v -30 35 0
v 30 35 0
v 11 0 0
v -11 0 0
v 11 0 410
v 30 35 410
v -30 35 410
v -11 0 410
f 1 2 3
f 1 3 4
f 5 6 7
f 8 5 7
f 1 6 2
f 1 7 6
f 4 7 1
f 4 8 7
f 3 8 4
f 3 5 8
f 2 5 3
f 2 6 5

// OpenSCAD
// DOGS Print Shop — parametric car seat gap filler wedge
// Units: millimeters.
// Conservative OpenSCAD only: polygon, linear_extrude, cylinder, difference.
// No experimental features; should render in any recent OpenSCAD.
//
// COMPILE CHECK: PENDING (no openscad binary on build machine, 2026-09-09).
// Print strategy: the full 410 mm wedge does NOT fit a standard 220 mm bed,
// so print part="front" and part="back", then join with the alignment pins
// (part="pins") and glue. PETG or ASA recommended — PLA softens in a hot car.

/* [Dimensions] */
wedge_length = 410;   // total length along the seat
top_width    = 60;    // width at the top (widest, sits proud of the gap)
bottom_width = 22;    // width at the bottom (taper that wedges into the gap)
wedge_height = 35;    // vertical height

/* [Print strategy] */
part      = "full";   // [full, front, back, pins]
pin_dia   = 6;       // alignment pin diameter
pin_depth = 12;      // how deep each pin seats into a half

half_len = wedge_length / 2;

module profile() {
    polygon(points = [
        [-bottom_width/2, 0],
        [ bottom_width/2, 0],
        [  top_width/2, wedge_height],
        [ -top_width/2, wedge_height]
    ]);
}

module wedge_solid(len) {
    linear_extrude(height = len) profile();
}

// One half of the split wedge, with two pin sockets on its cut face.
// cut_at_top=true  -> cut face at z = half_len (front half)
// cut_at_top=false -> cut face at z = 0       (back half)
module half_wedge(cut_at_top) {
    cut_z = cut_at_top ? half_len : 0;
    difference() {
        wedge_solid(half_len);
        for (sx = [-1, 1])
            translate([sx * top_width/4, wedge_height/2, cut_z])
                cylinder(d = pin_dia, h = pin_depth*2 + 2, center = true);
    }
}

// Alignment pin: print 4, glue two into each half's sockets.
module pin() {
    cylinder(d = pin_dia - 0.3, h = pin_depth * 2);
}

if (part == "full") {
    wedge_solid(wedge_length);
} else if (part == "front") {
    half_wedge(true);
} else if (part == "back") {
    half_wedge(false);
} else if (part == "pins") {
    for (i = [0:3])
        translate([i * (pin_dia + 4), 0, 0]) pin();
} else {
    echo("Unknown part. Use: full, front, back, pins.");
}
